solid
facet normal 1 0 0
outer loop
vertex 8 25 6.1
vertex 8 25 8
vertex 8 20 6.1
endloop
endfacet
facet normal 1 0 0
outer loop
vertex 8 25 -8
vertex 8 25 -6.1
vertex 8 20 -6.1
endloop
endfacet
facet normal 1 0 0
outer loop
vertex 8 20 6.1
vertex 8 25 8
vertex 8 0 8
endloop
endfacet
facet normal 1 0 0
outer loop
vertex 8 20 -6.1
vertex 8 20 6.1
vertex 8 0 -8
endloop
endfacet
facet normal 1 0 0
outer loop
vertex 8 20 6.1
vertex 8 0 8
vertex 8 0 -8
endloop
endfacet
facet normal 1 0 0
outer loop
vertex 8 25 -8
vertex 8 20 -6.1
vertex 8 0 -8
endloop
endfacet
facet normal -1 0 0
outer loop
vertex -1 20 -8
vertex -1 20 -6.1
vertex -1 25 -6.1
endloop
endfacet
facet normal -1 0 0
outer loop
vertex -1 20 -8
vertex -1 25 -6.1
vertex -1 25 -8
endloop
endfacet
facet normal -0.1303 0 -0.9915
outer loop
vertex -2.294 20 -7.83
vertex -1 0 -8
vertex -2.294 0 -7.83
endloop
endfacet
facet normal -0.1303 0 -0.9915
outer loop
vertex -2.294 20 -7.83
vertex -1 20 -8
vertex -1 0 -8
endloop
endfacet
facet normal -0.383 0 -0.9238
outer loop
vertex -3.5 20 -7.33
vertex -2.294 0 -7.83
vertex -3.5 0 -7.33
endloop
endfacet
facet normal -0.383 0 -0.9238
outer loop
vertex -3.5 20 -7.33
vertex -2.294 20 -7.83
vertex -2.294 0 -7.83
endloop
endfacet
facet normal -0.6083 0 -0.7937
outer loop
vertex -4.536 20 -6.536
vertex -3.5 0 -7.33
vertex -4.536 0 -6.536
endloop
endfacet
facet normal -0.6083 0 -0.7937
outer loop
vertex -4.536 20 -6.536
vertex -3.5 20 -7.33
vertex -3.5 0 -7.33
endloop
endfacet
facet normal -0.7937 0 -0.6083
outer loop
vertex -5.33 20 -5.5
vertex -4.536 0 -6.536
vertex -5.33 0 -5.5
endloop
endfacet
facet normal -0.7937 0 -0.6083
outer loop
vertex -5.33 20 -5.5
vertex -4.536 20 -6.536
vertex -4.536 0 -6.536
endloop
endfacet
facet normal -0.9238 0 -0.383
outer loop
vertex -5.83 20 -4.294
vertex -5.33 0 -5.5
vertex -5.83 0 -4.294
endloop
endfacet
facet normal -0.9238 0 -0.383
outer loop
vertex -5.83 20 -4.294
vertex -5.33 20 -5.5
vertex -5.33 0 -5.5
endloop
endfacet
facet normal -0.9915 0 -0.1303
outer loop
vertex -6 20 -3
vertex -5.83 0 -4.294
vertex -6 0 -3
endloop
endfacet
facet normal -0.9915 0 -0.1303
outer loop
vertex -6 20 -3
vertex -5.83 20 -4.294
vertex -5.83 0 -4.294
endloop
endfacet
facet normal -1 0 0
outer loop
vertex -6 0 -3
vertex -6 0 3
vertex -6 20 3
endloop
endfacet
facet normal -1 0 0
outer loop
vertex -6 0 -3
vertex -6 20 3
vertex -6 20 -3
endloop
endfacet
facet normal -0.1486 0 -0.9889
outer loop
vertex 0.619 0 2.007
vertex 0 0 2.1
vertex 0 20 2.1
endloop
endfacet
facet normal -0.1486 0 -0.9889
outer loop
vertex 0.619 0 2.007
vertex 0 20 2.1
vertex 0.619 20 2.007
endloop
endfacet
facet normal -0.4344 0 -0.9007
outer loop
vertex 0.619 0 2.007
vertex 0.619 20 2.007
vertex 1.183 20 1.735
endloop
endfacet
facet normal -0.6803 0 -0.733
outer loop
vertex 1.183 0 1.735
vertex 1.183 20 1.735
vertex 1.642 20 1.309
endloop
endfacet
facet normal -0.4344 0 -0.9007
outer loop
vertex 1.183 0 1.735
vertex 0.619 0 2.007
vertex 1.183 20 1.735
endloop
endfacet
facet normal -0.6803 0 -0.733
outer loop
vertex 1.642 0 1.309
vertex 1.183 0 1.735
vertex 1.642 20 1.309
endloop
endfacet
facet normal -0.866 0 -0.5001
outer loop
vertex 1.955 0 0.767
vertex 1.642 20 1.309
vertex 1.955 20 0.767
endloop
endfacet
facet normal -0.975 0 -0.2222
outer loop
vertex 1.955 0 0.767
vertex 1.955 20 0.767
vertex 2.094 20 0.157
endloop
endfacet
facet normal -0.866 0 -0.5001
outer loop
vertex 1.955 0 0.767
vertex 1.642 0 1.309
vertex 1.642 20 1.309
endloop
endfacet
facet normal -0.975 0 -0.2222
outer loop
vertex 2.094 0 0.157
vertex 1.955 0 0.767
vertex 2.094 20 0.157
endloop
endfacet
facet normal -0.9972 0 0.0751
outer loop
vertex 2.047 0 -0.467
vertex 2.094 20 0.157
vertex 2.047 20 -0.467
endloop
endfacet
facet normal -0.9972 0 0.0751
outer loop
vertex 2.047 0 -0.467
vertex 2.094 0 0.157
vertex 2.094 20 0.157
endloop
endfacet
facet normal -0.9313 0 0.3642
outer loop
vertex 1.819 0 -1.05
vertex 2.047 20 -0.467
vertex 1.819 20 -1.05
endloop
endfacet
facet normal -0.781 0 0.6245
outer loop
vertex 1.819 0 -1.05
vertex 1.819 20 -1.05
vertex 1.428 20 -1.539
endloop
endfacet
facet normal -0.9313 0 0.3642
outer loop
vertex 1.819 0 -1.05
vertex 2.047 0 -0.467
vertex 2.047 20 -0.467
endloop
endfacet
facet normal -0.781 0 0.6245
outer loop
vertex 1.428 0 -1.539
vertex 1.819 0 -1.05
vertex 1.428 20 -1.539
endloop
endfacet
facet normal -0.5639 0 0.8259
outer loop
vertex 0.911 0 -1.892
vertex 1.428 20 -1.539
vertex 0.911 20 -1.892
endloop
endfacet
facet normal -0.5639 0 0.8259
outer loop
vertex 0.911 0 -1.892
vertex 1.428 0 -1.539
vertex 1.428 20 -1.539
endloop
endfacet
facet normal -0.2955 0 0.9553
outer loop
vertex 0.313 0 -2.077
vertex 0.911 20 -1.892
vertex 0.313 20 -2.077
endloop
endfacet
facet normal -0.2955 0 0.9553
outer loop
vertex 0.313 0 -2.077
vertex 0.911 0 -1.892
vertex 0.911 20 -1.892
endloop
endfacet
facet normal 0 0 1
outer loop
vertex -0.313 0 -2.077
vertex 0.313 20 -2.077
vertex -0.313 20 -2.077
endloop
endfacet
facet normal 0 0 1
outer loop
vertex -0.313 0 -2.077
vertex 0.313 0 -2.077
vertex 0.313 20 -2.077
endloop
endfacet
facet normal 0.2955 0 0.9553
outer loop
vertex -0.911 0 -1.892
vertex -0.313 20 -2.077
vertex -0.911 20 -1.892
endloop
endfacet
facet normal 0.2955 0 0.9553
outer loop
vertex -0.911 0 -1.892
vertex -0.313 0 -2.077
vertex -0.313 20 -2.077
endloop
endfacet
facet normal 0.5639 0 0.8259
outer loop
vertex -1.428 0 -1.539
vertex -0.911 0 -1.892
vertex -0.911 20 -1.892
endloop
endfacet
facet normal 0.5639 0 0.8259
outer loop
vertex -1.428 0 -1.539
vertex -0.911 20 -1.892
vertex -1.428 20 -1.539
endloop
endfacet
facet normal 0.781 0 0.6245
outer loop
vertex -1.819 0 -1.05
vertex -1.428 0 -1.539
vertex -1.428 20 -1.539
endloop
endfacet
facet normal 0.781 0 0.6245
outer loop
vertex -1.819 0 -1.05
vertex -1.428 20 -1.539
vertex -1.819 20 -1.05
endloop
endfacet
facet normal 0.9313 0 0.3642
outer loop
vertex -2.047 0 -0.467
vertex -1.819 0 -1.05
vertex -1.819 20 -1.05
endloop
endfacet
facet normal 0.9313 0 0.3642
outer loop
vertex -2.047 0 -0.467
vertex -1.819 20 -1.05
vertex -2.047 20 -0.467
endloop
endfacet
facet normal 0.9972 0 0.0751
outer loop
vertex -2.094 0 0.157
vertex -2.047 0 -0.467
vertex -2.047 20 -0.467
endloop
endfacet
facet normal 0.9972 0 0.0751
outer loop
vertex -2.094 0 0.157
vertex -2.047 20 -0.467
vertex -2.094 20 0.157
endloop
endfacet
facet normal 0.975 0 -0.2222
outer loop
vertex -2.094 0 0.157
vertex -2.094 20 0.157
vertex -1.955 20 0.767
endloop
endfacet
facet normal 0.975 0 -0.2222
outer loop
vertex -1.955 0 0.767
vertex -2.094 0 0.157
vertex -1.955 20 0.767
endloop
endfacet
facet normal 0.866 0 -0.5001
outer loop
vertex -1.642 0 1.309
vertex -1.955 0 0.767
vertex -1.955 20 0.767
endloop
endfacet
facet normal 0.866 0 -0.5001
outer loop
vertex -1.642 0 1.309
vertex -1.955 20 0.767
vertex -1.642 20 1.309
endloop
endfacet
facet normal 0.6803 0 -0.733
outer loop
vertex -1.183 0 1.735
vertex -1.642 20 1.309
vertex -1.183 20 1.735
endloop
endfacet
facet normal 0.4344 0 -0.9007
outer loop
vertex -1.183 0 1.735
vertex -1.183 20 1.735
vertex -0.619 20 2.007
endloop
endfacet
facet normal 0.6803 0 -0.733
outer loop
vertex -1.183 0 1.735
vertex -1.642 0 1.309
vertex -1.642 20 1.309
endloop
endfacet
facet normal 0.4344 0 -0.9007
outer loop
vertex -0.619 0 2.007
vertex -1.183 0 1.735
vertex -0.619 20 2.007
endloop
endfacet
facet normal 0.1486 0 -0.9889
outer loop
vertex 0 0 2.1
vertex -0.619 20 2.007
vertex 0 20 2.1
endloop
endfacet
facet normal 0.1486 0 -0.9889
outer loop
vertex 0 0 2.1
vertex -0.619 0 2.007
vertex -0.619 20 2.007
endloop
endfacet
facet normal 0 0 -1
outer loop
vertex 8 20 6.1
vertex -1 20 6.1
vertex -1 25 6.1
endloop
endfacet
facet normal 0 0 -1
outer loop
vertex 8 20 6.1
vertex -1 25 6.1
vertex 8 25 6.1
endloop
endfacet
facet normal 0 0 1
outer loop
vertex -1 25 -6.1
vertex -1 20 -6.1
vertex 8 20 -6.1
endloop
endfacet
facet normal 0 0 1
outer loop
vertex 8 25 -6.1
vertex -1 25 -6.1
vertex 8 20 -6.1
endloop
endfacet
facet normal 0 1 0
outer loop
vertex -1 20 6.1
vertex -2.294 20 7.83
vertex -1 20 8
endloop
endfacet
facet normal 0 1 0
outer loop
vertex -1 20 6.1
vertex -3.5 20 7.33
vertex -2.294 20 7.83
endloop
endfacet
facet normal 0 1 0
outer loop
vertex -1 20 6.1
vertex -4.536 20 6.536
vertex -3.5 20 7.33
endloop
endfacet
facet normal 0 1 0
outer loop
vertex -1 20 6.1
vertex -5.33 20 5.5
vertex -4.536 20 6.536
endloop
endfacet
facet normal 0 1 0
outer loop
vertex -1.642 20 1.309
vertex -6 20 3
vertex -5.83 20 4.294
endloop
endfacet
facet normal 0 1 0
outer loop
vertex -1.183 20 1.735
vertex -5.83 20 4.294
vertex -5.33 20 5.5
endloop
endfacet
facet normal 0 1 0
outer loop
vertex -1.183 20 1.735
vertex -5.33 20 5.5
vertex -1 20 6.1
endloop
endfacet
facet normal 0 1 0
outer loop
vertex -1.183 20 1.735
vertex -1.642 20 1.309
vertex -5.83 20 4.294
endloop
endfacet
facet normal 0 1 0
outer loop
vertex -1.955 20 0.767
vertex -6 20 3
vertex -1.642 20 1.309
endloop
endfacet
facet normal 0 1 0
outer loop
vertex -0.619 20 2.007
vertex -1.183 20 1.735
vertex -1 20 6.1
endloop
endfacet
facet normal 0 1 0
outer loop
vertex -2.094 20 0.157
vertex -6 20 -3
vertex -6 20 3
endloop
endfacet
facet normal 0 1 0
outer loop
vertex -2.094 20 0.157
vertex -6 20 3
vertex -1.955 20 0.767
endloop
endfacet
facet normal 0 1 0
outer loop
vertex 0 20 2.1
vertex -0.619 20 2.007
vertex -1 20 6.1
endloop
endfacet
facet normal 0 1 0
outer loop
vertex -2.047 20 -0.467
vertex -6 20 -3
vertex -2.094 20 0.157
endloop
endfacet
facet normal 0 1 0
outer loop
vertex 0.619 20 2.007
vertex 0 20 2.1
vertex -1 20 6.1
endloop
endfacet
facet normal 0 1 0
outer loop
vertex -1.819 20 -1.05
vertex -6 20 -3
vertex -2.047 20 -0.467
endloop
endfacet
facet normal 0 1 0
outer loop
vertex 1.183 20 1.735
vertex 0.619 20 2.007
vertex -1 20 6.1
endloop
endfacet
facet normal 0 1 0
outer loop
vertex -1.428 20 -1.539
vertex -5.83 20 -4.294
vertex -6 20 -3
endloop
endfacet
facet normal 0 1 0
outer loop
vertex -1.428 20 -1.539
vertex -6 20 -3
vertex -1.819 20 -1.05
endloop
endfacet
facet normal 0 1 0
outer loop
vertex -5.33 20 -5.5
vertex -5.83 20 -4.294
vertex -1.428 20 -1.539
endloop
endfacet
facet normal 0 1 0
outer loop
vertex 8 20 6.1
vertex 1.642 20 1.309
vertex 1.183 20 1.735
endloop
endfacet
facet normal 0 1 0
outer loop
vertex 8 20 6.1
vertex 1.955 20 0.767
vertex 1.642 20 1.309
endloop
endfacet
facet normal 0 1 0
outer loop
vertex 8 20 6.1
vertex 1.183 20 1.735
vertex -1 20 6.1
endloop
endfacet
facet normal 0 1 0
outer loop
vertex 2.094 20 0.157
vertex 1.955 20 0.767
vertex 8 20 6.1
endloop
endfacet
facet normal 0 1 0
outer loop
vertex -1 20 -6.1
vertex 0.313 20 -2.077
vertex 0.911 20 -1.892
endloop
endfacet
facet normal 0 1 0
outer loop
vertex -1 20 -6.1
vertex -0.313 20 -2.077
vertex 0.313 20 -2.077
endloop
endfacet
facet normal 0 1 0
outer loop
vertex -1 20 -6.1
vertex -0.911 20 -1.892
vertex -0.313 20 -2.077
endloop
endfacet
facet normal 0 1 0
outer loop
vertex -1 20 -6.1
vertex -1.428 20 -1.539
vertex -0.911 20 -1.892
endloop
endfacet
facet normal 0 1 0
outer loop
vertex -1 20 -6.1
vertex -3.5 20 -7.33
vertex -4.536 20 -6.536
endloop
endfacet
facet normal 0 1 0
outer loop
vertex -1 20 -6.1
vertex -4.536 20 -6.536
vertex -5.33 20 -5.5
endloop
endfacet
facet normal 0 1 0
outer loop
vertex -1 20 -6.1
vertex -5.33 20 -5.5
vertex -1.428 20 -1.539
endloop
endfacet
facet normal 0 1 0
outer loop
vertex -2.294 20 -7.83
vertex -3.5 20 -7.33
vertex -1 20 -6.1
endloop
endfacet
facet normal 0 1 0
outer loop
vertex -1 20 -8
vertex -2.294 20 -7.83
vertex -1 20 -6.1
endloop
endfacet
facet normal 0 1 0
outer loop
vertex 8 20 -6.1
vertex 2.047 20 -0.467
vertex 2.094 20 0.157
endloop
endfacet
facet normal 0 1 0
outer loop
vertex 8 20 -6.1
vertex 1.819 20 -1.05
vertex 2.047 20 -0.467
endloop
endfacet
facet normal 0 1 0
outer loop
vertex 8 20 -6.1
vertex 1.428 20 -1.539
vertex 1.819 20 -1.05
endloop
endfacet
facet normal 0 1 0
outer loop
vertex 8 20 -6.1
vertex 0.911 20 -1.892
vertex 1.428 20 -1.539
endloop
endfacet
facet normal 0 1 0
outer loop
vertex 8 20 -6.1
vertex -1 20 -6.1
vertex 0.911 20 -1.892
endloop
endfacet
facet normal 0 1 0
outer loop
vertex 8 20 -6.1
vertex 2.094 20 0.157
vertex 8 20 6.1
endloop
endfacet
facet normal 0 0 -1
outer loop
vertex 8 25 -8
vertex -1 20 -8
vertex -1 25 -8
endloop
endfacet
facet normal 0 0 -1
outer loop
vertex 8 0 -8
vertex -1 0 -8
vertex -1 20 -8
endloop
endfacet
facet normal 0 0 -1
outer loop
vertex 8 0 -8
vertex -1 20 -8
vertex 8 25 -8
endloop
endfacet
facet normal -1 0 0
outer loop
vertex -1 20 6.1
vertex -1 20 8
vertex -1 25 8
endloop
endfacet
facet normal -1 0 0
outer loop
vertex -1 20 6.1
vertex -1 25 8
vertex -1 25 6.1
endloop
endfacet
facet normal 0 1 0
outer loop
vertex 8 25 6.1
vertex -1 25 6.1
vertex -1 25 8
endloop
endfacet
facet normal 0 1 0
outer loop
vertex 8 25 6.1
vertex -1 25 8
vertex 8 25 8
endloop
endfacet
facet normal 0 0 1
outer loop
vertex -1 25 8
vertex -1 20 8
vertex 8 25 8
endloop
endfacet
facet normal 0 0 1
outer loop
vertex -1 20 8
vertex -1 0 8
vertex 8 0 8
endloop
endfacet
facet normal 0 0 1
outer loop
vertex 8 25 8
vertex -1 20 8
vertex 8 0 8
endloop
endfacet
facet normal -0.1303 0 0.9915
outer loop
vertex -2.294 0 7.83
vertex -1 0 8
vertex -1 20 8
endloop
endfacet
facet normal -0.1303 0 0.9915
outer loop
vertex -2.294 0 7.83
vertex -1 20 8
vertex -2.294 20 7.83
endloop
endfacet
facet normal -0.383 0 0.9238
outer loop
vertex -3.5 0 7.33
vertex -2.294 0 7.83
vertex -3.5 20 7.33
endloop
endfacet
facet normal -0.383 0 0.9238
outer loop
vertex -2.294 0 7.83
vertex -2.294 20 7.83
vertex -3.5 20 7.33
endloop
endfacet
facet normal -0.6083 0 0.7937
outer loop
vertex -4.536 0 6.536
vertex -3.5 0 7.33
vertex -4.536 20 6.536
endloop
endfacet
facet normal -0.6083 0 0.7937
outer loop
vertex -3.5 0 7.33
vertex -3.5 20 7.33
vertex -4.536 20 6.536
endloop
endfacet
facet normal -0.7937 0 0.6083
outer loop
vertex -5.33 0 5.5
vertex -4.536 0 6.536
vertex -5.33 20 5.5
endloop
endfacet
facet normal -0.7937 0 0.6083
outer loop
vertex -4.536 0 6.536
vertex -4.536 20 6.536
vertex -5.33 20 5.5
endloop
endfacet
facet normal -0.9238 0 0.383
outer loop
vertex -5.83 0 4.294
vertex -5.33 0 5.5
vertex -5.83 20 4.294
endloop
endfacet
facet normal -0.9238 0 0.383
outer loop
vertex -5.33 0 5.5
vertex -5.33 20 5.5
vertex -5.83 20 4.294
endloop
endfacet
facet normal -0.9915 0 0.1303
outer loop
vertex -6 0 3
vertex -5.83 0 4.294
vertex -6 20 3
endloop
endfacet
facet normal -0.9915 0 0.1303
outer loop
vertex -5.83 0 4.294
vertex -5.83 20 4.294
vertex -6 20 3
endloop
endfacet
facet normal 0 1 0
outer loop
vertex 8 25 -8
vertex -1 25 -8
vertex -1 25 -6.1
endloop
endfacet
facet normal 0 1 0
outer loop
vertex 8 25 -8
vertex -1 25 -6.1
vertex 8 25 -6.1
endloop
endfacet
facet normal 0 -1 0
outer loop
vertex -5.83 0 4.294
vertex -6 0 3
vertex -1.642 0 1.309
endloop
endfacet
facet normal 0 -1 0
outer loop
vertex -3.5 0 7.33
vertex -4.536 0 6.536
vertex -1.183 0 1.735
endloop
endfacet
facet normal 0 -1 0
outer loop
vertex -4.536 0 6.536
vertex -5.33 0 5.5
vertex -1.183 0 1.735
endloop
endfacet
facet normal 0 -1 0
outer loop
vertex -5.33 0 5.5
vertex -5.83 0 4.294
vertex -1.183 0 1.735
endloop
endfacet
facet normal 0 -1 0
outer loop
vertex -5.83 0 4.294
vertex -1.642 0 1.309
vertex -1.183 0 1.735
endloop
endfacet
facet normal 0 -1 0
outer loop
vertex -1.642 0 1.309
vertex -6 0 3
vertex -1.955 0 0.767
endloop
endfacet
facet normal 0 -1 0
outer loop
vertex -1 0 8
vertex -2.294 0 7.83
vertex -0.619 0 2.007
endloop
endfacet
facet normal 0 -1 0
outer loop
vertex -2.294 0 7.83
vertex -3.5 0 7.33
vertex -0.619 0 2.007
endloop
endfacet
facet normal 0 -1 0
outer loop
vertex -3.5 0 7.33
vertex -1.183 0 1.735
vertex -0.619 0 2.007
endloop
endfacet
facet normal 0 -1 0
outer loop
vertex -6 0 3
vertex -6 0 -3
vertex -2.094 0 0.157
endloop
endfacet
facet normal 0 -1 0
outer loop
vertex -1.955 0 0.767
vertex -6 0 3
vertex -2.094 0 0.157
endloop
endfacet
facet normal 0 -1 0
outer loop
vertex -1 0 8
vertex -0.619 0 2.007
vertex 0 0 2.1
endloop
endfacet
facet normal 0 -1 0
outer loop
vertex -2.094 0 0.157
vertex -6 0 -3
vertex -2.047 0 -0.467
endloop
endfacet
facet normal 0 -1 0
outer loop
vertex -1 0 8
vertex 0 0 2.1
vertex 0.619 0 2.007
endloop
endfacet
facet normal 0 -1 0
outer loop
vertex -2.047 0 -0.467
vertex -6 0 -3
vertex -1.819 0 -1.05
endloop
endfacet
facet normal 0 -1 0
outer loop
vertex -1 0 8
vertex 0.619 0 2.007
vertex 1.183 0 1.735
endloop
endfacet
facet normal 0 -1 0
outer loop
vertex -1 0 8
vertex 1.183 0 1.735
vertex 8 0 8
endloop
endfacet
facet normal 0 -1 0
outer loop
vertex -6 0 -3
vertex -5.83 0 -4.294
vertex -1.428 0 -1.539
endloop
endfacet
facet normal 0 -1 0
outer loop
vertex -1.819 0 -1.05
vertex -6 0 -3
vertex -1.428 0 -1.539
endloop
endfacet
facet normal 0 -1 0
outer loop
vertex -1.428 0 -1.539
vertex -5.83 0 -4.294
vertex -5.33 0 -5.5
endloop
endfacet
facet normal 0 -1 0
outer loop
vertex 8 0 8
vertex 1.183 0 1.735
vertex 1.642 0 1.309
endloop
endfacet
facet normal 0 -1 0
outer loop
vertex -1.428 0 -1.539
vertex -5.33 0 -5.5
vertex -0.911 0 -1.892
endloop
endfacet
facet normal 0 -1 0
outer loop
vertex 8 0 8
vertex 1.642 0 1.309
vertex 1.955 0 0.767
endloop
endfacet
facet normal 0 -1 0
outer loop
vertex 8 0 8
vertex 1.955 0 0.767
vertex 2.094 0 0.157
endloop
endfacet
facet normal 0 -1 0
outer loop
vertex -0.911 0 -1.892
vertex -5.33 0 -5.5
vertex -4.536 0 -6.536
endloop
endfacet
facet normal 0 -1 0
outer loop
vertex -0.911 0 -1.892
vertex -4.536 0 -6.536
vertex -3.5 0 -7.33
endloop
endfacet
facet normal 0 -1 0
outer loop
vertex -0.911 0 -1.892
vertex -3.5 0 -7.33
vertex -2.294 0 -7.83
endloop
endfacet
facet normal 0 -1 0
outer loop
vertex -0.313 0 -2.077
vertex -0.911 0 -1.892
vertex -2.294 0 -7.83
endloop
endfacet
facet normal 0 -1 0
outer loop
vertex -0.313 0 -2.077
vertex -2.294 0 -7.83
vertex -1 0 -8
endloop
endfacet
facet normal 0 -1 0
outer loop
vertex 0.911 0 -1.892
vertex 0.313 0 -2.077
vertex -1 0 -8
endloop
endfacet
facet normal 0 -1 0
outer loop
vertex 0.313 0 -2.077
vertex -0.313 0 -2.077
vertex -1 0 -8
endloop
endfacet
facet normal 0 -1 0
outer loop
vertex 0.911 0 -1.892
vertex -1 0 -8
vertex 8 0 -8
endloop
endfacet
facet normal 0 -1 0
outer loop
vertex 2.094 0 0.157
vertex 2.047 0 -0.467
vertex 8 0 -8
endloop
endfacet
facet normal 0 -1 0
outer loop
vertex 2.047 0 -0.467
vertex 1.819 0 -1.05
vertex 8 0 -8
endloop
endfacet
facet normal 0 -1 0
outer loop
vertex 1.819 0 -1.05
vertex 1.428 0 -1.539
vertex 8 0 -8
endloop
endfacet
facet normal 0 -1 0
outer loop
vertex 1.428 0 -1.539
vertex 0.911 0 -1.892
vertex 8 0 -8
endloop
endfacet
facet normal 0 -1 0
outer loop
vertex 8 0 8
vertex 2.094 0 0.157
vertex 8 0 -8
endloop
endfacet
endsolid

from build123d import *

# Parameters (mm, degrees)
SKETCH1_W           = 12
SKETCH1_H           = 16
SKETCH1_R           = 2.1
SKETCH1_W_2         = 2
BOSS_EXTRUDE1_DEPTH = 20
FILLET1_R           = 5
SKETCH2_W           = 9
SKETCH2_H           = 1.9
BOSS_EXTRUDE2_DEPTH = 5


with BuildPart() as part:
    # Sketch1 → Boss-Extrude1 (new body)
    # profile 1 of 2: a face of its own
    with BuildSketch(Plane(origin=(0, 0, 0), x_dir=(1, 0, 0), z_dir=(0, 1, 0))):
        Rectangle(SKETCH1_W, SKETCH1_H)
        with Locations(Location((0, 0, 0), (0, 0, 270))):
            Circle(SKETCH1_R, mode=Mode.SUBTRACT)
    # profile 2 of 2: a face of its own
    with BuildSketch(Plane(origin=(0, 0, 0), x_dir=(1, 0, 0), z_dir=(0, 1, 0))):
        with Locations((7, 0)):
            Rectangle(SKETCH1_W_2, SKETCH1_H)
    extrude(amount=BOSS_EXTRUDE1_DEPTH)

    # Fillet1
    fillet1_edges = [part.edges().sort_by_distance(p)[0] for p in [
        (-6, 10, 8),
        (-6, 10, -8),
    ]]
    fillet(fillet1_edges, radius=FILLET1_R)

    # Sketch2 → Boss-Extrude2 (add)
    with BuildSketch(Plane(origin=(0, 20, 0), x_dir=(1, 0, 0), z_dir=(0, 1, 0))):
        with Locations((3.5, 7.05)):
            Rectangle(SKETCH2_W, SKETCH2_H)
        with Locations((3.5, -7.05)):
            Rectangle(SKETCH2_W, SKETCH2_H)
    extrude(amount=BOSS_EXTRUDE2_DEPTH)


solid = part.part
